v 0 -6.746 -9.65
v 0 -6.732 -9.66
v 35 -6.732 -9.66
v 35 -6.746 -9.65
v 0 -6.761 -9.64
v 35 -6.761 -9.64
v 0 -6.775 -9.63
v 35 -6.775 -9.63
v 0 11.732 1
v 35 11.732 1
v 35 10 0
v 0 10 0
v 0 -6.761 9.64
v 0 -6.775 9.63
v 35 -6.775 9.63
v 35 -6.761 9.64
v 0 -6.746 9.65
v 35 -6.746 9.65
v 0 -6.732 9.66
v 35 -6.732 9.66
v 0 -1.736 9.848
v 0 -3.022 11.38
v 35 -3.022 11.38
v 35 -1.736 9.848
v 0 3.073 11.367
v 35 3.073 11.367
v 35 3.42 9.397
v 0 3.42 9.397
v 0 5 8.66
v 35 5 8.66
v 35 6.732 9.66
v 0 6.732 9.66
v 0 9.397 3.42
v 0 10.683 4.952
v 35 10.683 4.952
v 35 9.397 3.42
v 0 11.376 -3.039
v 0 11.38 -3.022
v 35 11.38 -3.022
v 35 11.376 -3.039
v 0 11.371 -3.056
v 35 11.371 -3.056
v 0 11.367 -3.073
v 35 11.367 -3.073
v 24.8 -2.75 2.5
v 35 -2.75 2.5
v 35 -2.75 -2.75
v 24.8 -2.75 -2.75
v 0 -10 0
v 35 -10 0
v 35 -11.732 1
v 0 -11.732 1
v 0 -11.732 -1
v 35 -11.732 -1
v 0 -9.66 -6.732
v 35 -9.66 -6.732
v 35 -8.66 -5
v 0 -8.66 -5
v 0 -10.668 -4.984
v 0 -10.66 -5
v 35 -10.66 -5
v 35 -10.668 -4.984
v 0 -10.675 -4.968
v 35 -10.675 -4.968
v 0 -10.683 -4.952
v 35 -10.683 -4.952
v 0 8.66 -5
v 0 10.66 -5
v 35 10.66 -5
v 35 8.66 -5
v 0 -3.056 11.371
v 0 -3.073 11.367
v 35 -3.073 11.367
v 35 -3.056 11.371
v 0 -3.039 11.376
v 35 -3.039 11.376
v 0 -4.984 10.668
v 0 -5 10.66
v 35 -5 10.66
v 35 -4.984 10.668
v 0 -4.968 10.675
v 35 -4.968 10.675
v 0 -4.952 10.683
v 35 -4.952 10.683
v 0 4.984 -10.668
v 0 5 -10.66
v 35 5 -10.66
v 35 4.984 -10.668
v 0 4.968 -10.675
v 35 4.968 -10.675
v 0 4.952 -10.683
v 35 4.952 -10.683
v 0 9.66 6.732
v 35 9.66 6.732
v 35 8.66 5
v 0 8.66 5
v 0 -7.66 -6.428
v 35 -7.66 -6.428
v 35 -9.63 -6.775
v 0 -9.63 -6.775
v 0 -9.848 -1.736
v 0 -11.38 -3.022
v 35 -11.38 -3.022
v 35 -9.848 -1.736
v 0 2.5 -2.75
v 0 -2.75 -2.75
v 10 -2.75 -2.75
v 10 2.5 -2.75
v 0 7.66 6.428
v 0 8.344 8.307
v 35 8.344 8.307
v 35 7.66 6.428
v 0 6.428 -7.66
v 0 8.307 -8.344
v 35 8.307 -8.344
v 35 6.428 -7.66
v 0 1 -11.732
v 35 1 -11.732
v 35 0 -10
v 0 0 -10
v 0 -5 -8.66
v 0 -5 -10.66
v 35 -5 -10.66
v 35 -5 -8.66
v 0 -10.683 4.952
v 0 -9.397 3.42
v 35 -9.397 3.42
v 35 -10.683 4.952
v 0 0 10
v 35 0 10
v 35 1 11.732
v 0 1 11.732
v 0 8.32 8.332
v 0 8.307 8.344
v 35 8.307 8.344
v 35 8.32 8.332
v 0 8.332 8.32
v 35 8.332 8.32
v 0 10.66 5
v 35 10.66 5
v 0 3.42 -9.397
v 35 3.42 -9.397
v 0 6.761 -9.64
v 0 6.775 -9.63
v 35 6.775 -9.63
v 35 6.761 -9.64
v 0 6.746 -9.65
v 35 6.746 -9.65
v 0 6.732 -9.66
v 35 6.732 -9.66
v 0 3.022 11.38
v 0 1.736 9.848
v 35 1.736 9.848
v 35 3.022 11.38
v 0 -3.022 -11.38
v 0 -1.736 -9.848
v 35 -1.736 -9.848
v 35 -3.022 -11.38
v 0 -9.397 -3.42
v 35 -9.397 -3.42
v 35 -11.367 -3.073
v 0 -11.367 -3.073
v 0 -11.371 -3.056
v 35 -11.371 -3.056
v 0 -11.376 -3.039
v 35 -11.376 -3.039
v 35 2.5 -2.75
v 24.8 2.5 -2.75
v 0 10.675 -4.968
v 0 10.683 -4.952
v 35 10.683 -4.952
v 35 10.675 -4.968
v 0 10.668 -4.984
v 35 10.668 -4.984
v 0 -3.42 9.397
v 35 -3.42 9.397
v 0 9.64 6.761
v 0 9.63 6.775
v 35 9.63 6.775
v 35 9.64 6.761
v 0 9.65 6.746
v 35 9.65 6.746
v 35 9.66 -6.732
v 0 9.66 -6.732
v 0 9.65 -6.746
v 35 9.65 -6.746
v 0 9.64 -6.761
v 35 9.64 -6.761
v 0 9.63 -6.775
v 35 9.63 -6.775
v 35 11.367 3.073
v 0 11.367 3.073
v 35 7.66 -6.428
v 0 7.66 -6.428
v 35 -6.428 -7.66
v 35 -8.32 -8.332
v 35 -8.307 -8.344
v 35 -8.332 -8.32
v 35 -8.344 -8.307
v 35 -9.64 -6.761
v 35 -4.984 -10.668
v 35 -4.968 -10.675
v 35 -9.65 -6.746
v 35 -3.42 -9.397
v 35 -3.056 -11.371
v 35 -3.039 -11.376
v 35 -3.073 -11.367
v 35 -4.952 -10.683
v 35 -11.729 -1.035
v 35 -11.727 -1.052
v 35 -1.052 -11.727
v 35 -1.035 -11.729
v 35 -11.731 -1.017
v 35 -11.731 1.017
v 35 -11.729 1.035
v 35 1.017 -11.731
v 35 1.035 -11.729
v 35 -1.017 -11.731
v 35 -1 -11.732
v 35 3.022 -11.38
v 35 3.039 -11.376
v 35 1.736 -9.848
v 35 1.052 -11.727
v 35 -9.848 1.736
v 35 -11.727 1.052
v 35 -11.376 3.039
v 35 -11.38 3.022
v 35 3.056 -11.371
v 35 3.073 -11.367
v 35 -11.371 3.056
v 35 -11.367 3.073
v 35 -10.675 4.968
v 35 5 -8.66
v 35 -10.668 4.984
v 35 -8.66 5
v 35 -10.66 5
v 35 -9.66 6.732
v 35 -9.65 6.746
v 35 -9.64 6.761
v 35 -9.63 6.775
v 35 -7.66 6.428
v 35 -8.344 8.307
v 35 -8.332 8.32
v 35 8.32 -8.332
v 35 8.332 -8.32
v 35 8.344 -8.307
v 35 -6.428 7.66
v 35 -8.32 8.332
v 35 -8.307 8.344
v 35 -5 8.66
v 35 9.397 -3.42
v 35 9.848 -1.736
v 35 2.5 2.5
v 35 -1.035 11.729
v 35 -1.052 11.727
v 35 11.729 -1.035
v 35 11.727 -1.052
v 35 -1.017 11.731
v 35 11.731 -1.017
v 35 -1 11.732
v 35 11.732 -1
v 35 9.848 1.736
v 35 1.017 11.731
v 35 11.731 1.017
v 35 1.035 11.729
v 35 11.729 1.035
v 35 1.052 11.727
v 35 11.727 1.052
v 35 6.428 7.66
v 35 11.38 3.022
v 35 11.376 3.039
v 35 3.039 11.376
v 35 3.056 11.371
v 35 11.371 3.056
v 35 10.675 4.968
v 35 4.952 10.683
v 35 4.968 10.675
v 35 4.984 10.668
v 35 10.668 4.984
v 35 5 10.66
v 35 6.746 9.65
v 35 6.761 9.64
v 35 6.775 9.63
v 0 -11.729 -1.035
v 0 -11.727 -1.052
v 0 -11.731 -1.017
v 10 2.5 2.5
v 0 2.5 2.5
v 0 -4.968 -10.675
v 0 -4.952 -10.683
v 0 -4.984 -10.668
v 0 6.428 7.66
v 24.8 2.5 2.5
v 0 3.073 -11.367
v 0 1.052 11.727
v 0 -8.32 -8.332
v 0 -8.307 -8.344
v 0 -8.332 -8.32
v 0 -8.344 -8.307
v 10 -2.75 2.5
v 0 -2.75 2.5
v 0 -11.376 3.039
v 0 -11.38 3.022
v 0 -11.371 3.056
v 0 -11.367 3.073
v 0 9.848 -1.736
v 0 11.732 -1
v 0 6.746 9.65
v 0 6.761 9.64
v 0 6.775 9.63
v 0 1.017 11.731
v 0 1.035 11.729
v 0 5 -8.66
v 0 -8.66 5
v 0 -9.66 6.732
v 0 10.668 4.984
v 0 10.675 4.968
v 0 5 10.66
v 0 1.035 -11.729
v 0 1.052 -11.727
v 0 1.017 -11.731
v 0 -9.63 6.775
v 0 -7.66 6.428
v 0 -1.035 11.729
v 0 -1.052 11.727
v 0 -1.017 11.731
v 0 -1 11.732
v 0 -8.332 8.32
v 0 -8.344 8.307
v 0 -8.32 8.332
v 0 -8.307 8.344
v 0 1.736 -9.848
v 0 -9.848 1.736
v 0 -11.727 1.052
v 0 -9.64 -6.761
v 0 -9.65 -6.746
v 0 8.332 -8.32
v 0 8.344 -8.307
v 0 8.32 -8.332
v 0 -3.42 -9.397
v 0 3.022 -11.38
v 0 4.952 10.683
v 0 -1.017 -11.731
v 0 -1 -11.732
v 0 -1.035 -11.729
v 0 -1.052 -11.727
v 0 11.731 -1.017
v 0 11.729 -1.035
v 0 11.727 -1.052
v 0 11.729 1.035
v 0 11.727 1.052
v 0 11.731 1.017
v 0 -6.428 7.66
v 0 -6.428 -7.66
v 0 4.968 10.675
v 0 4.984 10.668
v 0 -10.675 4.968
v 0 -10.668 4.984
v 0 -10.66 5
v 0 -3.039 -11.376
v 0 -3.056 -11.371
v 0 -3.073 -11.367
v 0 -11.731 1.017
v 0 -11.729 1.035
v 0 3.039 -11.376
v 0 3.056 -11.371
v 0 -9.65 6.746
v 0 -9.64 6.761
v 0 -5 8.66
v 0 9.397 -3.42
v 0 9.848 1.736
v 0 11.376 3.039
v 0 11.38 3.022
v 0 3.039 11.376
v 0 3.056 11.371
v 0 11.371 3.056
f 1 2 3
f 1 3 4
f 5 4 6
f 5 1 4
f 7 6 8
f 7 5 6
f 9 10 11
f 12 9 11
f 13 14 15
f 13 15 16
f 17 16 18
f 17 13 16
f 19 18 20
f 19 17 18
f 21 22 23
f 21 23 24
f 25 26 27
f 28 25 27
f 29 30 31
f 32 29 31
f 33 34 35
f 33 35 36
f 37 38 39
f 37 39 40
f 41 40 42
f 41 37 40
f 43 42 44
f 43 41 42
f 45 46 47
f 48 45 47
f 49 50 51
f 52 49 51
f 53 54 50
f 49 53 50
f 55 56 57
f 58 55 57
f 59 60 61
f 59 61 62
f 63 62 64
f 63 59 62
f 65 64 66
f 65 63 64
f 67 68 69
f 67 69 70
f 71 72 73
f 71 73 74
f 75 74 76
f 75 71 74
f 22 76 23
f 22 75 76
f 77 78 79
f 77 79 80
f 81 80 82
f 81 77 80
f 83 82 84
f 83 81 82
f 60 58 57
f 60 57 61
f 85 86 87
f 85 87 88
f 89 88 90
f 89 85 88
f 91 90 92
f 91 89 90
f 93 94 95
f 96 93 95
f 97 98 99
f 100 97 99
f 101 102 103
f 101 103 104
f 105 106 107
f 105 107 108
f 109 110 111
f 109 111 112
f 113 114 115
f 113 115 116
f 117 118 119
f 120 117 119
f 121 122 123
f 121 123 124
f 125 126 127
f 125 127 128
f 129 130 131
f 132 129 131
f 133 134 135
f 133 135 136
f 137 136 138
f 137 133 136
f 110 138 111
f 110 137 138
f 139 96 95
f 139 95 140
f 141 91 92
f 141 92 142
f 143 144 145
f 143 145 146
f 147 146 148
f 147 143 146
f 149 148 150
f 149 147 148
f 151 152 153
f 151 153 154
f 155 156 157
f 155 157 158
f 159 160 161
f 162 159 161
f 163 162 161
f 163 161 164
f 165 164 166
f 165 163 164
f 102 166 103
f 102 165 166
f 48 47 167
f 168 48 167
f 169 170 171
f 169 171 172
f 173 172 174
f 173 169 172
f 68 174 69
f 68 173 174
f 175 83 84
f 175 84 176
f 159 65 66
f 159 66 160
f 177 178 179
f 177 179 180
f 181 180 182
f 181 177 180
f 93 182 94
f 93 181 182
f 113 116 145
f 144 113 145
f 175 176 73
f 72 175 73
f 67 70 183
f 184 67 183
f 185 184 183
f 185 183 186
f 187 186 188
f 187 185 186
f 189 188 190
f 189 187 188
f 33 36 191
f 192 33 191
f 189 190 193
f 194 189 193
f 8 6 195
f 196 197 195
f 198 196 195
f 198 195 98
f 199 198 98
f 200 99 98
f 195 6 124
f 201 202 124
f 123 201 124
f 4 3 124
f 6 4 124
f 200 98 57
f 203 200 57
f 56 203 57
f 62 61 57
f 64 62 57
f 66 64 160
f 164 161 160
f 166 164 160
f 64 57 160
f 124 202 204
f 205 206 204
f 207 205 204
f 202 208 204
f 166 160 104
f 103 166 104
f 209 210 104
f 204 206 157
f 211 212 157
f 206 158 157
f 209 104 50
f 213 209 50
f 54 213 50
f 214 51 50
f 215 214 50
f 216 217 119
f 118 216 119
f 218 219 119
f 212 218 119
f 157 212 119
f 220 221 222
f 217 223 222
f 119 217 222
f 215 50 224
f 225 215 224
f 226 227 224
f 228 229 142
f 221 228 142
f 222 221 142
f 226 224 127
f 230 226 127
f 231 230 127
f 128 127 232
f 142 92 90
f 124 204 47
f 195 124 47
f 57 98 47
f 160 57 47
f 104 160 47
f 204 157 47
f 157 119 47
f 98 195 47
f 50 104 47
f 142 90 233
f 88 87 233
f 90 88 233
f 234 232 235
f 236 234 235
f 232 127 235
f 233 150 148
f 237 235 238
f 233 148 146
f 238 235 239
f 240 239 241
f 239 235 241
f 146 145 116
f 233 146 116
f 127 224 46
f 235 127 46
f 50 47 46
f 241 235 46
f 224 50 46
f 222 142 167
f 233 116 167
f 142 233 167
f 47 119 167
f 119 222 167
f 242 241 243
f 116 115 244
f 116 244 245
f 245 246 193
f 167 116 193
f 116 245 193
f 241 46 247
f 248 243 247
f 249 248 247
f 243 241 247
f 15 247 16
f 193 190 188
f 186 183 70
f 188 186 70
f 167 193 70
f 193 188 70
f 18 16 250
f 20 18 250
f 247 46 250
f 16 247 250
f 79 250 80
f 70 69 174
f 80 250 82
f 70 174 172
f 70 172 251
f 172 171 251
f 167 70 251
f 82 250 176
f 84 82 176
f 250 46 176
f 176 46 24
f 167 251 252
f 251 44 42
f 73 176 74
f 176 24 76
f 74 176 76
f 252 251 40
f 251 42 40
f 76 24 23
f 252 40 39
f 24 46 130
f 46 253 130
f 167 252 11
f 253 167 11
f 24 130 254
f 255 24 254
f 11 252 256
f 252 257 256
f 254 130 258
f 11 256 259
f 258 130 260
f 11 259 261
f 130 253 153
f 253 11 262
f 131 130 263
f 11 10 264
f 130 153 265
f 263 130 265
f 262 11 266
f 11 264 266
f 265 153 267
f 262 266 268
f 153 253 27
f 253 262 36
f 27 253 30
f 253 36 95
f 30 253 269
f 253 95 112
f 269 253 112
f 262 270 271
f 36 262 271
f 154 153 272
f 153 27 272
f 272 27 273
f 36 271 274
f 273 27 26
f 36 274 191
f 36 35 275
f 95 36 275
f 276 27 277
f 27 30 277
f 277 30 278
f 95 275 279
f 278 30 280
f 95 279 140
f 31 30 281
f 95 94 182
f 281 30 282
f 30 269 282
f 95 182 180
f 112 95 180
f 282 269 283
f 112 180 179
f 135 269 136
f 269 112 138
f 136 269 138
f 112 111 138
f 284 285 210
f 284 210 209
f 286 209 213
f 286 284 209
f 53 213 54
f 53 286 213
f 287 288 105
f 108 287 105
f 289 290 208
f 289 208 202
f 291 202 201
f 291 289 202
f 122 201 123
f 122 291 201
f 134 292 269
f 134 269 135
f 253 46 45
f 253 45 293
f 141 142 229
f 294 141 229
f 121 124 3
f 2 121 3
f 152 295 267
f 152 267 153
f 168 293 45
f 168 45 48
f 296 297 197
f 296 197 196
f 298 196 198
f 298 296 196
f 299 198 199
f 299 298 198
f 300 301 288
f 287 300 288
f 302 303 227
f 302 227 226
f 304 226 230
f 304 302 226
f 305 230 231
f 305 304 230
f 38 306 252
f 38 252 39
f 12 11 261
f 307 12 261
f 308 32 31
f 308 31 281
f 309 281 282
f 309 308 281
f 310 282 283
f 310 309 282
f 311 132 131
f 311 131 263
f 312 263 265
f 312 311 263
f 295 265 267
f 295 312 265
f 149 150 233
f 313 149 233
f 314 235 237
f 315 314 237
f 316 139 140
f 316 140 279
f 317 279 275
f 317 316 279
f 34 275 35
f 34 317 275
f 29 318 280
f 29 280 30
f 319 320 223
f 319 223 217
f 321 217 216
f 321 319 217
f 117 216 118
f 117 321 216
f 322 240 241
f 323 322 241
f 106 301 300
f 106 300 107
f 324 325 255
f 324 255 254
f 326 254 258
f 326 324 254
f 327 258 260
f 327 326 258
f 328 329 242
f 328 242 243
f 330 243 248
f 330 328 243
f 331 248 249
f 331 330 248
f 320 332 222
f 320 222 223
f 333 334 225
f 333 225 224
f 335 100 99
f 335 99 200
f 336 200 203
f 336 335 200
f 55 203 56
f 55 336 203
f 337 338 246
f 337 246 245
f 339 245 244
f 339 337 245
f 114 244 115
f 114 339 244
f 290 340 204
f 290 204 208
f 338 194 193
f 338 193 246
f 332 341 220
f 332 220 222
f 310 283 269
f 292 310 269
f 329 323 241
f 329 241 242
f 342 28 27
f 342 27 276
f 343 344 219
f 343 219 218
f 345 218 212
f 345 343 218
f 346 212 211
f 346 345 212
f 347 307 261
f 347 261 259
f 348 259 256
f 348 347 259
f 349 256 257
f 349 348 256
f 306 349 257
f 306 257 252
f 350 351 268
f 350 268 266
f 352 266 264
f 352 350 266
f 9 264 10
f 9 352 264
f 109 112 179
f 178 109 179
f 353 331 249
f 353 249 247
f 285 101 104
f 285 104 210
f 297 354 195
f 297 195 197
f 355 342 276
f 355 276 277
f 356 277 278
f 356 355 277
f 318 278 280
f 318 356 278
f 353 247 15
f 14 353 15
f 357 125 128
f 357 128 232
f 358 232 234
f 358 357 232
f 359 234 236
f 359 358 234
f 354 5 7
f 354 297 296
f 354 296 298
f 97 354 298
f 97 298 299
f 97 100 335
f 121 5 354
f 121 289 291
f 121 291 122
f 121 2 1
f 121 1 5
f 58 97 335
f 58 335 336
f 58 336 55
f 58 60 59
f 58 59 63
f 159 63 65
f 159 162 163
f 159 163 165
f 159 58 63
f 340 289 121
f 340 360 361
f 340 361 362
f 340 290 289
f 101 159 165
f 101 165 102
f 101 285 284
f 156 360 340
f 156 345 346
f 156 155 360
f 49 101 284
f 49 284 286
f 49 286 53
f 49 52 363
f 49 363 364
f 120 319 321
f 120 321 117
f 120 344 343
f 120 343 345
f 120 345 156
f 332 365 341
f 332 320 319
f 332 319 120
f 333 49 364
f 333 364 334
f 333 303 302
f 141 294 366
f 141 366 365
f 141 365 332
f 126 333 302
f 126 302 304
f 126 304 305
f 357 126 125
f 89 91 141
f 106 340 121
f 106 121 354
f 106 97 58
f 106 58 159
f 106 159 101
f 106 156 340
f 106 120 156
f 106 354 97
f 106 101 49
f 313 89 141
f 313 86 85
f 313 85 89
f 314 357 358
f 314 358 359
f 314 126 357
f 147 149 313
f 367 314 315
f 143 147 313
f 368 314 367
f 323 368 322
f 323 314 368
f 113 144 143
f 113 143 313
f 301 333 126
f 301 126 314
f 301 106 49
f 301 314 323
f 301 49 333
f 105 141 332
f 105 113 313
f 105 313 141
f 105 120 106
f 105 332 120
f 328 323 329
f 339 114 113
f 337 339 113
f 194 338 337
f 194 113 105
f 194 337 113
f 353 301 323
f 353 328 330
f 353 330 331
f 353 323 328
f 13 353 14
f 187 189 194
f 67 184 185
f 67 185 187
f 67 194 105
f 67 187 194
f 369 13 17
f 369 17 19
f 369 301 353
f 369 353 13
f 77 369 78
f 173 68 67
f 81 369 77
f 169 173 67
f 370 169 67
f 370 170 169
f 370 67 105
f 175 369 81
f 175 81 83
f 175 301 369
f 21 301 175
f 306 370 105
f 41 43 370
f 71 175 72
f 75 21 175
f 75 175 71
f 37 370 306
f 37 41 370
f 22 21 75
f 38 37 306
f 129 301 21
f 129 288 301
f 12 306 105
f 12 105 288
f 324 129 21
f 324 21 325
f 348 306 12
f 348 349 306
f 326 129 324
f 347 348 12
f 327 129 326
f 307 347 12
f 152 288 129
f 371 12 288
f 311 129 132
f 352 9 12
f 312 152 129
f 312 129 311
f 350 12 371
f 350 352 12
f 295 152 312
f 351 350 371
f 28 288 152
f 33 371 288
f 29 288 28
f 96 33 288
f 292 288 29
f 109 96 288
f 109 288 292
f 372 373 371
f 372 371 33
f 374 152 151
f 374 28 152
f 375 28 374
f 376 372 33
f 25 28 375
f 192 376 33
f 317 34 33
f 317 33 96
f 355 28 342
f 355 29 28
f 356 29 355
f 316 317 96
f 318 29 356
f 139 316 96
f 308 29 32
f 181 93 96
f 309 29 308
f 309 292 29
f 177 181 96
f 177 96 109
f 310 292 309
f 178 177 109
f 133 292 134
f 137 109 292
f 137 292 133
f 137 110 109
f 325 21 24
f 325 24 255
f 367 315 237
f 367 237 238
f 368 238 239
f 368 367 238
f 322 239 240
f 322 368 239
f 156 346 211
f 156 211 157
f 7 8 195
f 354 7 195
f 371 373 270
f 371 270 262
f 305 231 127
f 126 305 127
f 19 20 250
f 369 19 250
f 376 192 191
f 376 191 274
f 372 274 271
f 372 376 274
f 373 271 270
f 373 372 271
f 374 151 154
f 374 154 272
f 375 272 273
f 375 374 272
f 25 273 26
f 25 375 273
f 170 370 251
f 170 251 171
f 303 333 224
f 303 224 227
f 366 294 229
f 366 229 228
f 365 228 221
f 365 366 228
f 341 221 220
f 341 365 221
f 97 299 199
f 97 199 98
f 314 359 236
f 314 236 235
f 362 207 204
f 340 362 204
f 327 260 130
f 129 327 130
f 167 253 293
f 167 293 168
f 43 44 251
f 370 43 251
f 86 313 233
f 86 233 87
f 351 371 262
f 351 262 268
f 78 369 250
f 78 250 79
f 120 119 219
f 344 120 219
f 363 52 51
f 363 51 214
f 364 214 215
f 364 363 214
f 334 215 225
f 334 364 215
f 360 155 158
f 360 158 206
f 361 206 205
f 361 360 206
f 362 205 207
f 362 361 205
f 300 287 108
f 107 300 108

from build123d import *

# Parameters (mm, degrees)
BOSS_EXTRUDE1_DEPTH = 35
SKETCH3_W           = 5.25
SKETCH3_H           = 5.25
CUT_EXTRUDE2_DEPTH  = 10.2
CUT_EXTRUDE3_START  = -35
SKETCH3_2_W         = 5.25
SKETCH3_2_H         = 5.25
CUT_EXTRUDE3_DEPTH  = 10


with BuildPart() as part:
    # Sketch1 → Boss-Extrude1 (new body)
    with BuildSketch(Plane(origin=(0, 0, 0), x_dir=(0, 0, -1), z_dir=(1, 0, 0))):
        with BuildLine():
            Line((-1, 11.732050808), (0, 10))
            Line((0, 10), (1, 11.732050808))
            ThreePointArc((1, 11.732050808), (1.026223309, 11.729786097), (1.05244149, 11.727462772))
            Line((1.05244149, 11.727462772), (1.736481777, 9.84807753))
            Line((1.736481777, 9.84807753), (3.022056996, 11.380166416))
            ThreePointArc((3.022056996, 11.380166416), (3.047488651, 11.373382482), (3.072905078, 11.366541714))
            Line((3.072905078, 11.366541714), (3.420201433, 9.396926208))
            Line((3.420201433, 9.396926208), (4.952290319, 10.682501427))
            ThreePointArc((4.952290319, 10.682501427), (4.976157593, 10.671404395), (5, 10.660254038))
            Line((5, 10.660254038), (5, 8.660254038))
            Line((5, 8.660254038), (6.732050808, 9.660254038))
            ThreePointArc((6.732050808, 9.660254038), (6.753628504, 9.645181086), (6.775172452, 9.630059937))
            Line((6.775172452, 9.630059937), (6.427876097, 7.660444431))
            Line((6.427876097, 7.660444431), (8.307261338, 8.344484718))
            ThreePointArc((8.307261338, 8.344484718), (8.32589383, 8.32589383), (8.344484718, 8.307261338))
            Line((8.344484718, 8.307261338), (7.660444431, 6.427876097))
            Line((7.660444431, 6.427876097), (9.630059937, 6.775172452))
            ThreePointArc((9.630059937, 6.775172452), (9.645181086, 6.753628504), (9.660254038, 6.732050808))
            Line((9.660254038, 6.732050808), (8.660254038, 5))
            Line((8.660254038, 5), (10.660254038, 5))
            ThreePointArc((10.660254038, 5), (10.671404395, 4.976157593), (10.682501427, 4.952290319))
            Line((10.682501427, 4.952290319), (9.396926208, 3.420201433))
            Line((9.396926208, 3.420201433), (11.366541714, 3.072905078))
            ThreePointArc((11.366541714, 3.072905078), (11.373382482, 3.047488651), (11.380166416, 3.022056996))
            Line((11.380166416, 3.022056996), (9.84807753, 1.736481777))
            Line((9.84807753, 1.736481777), (11.727462772, 1.05244149))
            ThreePointArc((11.727462772, 1.05244149), (11.729786097, 1.026223309), (11.732050808, 1))
            Line((11.732050808, 1), (10, 0))
            Line((10, 0), (11.732050808, -1))
            ThreePointArc((11.732050808, -1), (11.729786097, -1.026223309), (11.727462772, -1.05244149))
            Line((11.727462772, -1.05244149), (9.84807753, -1.736481777))
            Line((9.84807753, -1.736481777), (11.380166416, -3.022056996))
            ThreePointArc((11.380166416, -3.022056996), (11.373382482, -3.047488651), (11.366541714, -3.072905078))
            Line((11.366541714, -3.072905078), (9.396926208, -3.420201433))
            Line((9.396926208, -3.420201433), (10.682501427, -4.952290319))
            ThreePointArc((10.682501427, -4.952290319), (10.671404395, -4.976157593), (10.660254038, -5))
            Line((10.660254038, -5), (8.660254038, -5))
            Line((8.660254038, -5), (9.660254038, -6.732050808))
            ThreePointArc((9.660254038, -6.732050808), (9.645181086, -6.753628504), (9.630059937, -6.775172452))
            Line((9.630059937, -6.775172452), (7.660444431, -6.427876097))
            Line((7.660444431, -6.427876097), (8.344484718, -8.307261338))
            ThreePointArc((8.344484718, -8.307261338), (8.32589383, -8.32589383), (8.307261338, -8.344484718))
            Line((8.307261338, -8.344484718), (6.427876097, -7.660444431))
            Line((6.427876097, -7.660444431), (6.775172452, -9.630059937))
            ThreePointArc((6.775172452, -9.630059937), (6.753628504, -9.645181086), (6.732050808, -9.660254038))
            Line((6.732050808, -9.660254038), (5, -8.660254038))
            Line((5, -8.660254038), (5, -10.660254038))
            ThreePointArc((5, -10.660254038), (4.976157593, -10.671404395), (4.952290319, -10.682501427))
            Line((4.952290319, -10.682501427), (3.420201433, -9.396926208))
            Line((3.420201433, -9.396926208), (3.072905078, -11.366541714))
            ThreePointArc((3.072905078, -11.366541714), (3.047488651, -11.373382482), (3.022056996, -11.380166416))
            Line((3.022056996, -11.380166416), (1.736481777, -9.84807753))
            Line((1.736481777, -9.84807753), (1.05244149, -11.727462772))
            ThreePointArc((1.05244149, -11.727462772), (1.026223309, -11.729786097), (1, -11.732050808))
            Line((1, -11.732050808), (0, -10))
            Line((0, -10), (-1, -11.732050808))
            ThreePointArc((-1, -11.732050808), (-1.026223309, -11.729786097), (-1.05244149, -11.727462772))
            Line((-1.05244149, -11.727462772), (-1.736481777, -9.84807753))
            Line((-1.736481777, -9.84807753), (-3.022056996, -11.380166416))
            ThreePointArc((-3.022056996, -11.380166416), (-3.047488651, -11.373382482), (-3.072905078, -11.366541714))
            Line((-3.072905078, -11.366541714), (-3.420201433, -9.396926208))
            Line((-3.420201433, -9.396926208), (-4.952290319, -10.682501427))
            ThreePointArc((-4.952290319, -10.682501427), (-4.976157593, -10.671404395), (-5, -10.660254038))
            Line((-5, -10.660254038), (-5, -8.660254038))
            Line((-5, -8.660254038), (-6.732050808, -9.660254038))
            ThreePointArc((-6.732050808, -9.660254038), (-6.753628504, -9.645181086), (-6.775172452, -9.630059937))
            Line((-6.775172452, -9.630059937), (-6.427876097, -7.660444431))
            Line((-6.427876097, -7.660444431), (-8.307261338, -8.344484718))
            ThreePointArc((-8.307261338, -8.344484718), (-8.32589383, -8.32589383), (-8.344484718, -8.307261338))
            Line((-8.344484718, -8.307261338), (-7.660444431, -6.427876097))
            Line((-7.660444431, -6.427876097), (-9.630059937, -6.775172452))
            ThreePointArc((-9.630059937, -6.775172452), (-9.645181086, -6.753628504), (-9.660254038, -6.732050808))
            Line((-9.660254038, -6.732050808), (-8.660254038, -5))
            Line((-8.660254038, -5), (-10.660254038, -5))
            ThreePointArc((-10.660254038, -5), (-10.671404395, -4.976157593), (-10.682501427, -4.952290319))
            Line((-10.682501427, -4.952290319), (-9.396926208, -3.420201433))
            Line((-9.396926208, -3.420201433), (-11.366541714, -3.072905078))
            ThreePointArc((-11.366541714, -3.072905078), (-11.373382482, -3.047488651), (-11.380166416, -3.022056996))
            Line((-11.380166416, -3.022056996), (-9.84807753, -1.736481777))
            Line((-9.84807753, -1.736481777), (-11.727462772, -1.05244149))
            ThreePointArc((-11.727462772, -1.05244149), (-11.729786097, -1.026223309), (-11.732050808, -1))
            Line((-11.732050808, -1), (-10, 0))
            Line((-10, 0), (-11.732050808, 1))
            ThreePointArc((-11.732050808, 1), (-11.729786097, 1.026223309), (-11.727462772, 1.05244149))
            Line((-11.727462772, 1.05244149), (-9.84807753, 1.736481777))
            Line((-9.84807753, 1.736481777), (-11.380166416, 3.022056996))
            ThreePointArc((-11.380166416, 3.022056996), (-11.373382482, 3.047488651), (-11.366541714, 3.072905078))
            Line((-11.366541714, 3.072905078), (-9.396926208, 3.420201433))
            Line((-9.396926208, 3.420201433), (-10.682501427, 4.952290319))
            ThreePointArc((-10.682501427, 4.952290319), (-10.671404395, 4.976157593), (-10.660254038, 5))
            Line((-10.660254038, 5), (-8.660254038, 5))
            Line((-8.660254038, 5), (-9.660254038, 6.732050808))
            ThreePointArc((-9.660254038, 6.732050808), (-9.645181086, 6.753628504), (-9.630059937, 6.775172452))
            Line((-9.630059937, 6.775172452), (-7.660444431, 6.427876097))
            Line((-7.660444431, 6.427876097), (-8.344484718, 8.307261338))
            ThreePointArc((-8.344484718, 8.307261338), (-8.32589383, 8.32589383), (-8.307261338, 8.344484718))
            Line((-8.307261338, 8.344484718), (-6.427876097, 7.660444431))
            Line((-6.427876097, 7.660444431), (-6.775172452, 9.630059937))
            ThreePointArc((-6.775172452, 9.630059937), (-6.753628504, 9.645181086), (-6.732050808, 9.660254038))
            Line((-6.732050808, 9.660254038), (-5, 8.660254038))
            Line((-5, 8.660254038), (-5, 10.660254038))
            ThreePointArc((-5, 10.660254038), (-4.976157593, 10.671404395), (-4.952290319, 10.682501427))
            Line((-4.952290319, 10.682501427), (-3.420201433, 9.396926208))
            Line((-3.420201433, 9.396926208), (-3.072905078, 11.366541714))
            ThreePointArc((-3.072905078, 11.366541714), (-3.047488651, 11.373382482), (-3.022056996, 11.380166416))
            Line((-3.022056996, 11.380166416), (-1.736481777, 9.84807753))
            Line((-1.736481777, 9.84807753), (-1.05244149, 11.727462772))
            ThreePointArc((-1.05244149, 11.727462772), (-1.026223309, 11.729786097), (-1, 11.732050808))
        make_face()
    extrude(amount=BOSS_EXTRUDE1_DEPTH)

    # Sketch3 → Cut-Extrude2 (cut)
    with BuildSketch(Plane(origin=(35, 0, 0), x_dir=(0, 0, -1), z_dir=(1, 0, 0))):
        with Locations((0.125, -0.125)):
            Rectangle(SKETCH3_W, SKETCH3_H)
    extrude(amount=-CUT_EXTRUDE2_DEPTH, mode=Mode.SUBTRACT)

    # Sketch3<2> → Cut-Extrude3 (cut)
    with BuildSketch(Plane(origin=(35, 0, 0), x_dir=(0, 0, -1), z_dir=(1, 0, 0)).offset(CUT_EXTRUDE3_START)):
        with Locations((0.125, -0.125)):
            Rectangle(SKETCH3_2_W, SKETCH3_2_H)
    extrude(amount=CUT_EXTRUDE3_DEPTH, mode=Mode.SUBTRACT)


solid = part.part
